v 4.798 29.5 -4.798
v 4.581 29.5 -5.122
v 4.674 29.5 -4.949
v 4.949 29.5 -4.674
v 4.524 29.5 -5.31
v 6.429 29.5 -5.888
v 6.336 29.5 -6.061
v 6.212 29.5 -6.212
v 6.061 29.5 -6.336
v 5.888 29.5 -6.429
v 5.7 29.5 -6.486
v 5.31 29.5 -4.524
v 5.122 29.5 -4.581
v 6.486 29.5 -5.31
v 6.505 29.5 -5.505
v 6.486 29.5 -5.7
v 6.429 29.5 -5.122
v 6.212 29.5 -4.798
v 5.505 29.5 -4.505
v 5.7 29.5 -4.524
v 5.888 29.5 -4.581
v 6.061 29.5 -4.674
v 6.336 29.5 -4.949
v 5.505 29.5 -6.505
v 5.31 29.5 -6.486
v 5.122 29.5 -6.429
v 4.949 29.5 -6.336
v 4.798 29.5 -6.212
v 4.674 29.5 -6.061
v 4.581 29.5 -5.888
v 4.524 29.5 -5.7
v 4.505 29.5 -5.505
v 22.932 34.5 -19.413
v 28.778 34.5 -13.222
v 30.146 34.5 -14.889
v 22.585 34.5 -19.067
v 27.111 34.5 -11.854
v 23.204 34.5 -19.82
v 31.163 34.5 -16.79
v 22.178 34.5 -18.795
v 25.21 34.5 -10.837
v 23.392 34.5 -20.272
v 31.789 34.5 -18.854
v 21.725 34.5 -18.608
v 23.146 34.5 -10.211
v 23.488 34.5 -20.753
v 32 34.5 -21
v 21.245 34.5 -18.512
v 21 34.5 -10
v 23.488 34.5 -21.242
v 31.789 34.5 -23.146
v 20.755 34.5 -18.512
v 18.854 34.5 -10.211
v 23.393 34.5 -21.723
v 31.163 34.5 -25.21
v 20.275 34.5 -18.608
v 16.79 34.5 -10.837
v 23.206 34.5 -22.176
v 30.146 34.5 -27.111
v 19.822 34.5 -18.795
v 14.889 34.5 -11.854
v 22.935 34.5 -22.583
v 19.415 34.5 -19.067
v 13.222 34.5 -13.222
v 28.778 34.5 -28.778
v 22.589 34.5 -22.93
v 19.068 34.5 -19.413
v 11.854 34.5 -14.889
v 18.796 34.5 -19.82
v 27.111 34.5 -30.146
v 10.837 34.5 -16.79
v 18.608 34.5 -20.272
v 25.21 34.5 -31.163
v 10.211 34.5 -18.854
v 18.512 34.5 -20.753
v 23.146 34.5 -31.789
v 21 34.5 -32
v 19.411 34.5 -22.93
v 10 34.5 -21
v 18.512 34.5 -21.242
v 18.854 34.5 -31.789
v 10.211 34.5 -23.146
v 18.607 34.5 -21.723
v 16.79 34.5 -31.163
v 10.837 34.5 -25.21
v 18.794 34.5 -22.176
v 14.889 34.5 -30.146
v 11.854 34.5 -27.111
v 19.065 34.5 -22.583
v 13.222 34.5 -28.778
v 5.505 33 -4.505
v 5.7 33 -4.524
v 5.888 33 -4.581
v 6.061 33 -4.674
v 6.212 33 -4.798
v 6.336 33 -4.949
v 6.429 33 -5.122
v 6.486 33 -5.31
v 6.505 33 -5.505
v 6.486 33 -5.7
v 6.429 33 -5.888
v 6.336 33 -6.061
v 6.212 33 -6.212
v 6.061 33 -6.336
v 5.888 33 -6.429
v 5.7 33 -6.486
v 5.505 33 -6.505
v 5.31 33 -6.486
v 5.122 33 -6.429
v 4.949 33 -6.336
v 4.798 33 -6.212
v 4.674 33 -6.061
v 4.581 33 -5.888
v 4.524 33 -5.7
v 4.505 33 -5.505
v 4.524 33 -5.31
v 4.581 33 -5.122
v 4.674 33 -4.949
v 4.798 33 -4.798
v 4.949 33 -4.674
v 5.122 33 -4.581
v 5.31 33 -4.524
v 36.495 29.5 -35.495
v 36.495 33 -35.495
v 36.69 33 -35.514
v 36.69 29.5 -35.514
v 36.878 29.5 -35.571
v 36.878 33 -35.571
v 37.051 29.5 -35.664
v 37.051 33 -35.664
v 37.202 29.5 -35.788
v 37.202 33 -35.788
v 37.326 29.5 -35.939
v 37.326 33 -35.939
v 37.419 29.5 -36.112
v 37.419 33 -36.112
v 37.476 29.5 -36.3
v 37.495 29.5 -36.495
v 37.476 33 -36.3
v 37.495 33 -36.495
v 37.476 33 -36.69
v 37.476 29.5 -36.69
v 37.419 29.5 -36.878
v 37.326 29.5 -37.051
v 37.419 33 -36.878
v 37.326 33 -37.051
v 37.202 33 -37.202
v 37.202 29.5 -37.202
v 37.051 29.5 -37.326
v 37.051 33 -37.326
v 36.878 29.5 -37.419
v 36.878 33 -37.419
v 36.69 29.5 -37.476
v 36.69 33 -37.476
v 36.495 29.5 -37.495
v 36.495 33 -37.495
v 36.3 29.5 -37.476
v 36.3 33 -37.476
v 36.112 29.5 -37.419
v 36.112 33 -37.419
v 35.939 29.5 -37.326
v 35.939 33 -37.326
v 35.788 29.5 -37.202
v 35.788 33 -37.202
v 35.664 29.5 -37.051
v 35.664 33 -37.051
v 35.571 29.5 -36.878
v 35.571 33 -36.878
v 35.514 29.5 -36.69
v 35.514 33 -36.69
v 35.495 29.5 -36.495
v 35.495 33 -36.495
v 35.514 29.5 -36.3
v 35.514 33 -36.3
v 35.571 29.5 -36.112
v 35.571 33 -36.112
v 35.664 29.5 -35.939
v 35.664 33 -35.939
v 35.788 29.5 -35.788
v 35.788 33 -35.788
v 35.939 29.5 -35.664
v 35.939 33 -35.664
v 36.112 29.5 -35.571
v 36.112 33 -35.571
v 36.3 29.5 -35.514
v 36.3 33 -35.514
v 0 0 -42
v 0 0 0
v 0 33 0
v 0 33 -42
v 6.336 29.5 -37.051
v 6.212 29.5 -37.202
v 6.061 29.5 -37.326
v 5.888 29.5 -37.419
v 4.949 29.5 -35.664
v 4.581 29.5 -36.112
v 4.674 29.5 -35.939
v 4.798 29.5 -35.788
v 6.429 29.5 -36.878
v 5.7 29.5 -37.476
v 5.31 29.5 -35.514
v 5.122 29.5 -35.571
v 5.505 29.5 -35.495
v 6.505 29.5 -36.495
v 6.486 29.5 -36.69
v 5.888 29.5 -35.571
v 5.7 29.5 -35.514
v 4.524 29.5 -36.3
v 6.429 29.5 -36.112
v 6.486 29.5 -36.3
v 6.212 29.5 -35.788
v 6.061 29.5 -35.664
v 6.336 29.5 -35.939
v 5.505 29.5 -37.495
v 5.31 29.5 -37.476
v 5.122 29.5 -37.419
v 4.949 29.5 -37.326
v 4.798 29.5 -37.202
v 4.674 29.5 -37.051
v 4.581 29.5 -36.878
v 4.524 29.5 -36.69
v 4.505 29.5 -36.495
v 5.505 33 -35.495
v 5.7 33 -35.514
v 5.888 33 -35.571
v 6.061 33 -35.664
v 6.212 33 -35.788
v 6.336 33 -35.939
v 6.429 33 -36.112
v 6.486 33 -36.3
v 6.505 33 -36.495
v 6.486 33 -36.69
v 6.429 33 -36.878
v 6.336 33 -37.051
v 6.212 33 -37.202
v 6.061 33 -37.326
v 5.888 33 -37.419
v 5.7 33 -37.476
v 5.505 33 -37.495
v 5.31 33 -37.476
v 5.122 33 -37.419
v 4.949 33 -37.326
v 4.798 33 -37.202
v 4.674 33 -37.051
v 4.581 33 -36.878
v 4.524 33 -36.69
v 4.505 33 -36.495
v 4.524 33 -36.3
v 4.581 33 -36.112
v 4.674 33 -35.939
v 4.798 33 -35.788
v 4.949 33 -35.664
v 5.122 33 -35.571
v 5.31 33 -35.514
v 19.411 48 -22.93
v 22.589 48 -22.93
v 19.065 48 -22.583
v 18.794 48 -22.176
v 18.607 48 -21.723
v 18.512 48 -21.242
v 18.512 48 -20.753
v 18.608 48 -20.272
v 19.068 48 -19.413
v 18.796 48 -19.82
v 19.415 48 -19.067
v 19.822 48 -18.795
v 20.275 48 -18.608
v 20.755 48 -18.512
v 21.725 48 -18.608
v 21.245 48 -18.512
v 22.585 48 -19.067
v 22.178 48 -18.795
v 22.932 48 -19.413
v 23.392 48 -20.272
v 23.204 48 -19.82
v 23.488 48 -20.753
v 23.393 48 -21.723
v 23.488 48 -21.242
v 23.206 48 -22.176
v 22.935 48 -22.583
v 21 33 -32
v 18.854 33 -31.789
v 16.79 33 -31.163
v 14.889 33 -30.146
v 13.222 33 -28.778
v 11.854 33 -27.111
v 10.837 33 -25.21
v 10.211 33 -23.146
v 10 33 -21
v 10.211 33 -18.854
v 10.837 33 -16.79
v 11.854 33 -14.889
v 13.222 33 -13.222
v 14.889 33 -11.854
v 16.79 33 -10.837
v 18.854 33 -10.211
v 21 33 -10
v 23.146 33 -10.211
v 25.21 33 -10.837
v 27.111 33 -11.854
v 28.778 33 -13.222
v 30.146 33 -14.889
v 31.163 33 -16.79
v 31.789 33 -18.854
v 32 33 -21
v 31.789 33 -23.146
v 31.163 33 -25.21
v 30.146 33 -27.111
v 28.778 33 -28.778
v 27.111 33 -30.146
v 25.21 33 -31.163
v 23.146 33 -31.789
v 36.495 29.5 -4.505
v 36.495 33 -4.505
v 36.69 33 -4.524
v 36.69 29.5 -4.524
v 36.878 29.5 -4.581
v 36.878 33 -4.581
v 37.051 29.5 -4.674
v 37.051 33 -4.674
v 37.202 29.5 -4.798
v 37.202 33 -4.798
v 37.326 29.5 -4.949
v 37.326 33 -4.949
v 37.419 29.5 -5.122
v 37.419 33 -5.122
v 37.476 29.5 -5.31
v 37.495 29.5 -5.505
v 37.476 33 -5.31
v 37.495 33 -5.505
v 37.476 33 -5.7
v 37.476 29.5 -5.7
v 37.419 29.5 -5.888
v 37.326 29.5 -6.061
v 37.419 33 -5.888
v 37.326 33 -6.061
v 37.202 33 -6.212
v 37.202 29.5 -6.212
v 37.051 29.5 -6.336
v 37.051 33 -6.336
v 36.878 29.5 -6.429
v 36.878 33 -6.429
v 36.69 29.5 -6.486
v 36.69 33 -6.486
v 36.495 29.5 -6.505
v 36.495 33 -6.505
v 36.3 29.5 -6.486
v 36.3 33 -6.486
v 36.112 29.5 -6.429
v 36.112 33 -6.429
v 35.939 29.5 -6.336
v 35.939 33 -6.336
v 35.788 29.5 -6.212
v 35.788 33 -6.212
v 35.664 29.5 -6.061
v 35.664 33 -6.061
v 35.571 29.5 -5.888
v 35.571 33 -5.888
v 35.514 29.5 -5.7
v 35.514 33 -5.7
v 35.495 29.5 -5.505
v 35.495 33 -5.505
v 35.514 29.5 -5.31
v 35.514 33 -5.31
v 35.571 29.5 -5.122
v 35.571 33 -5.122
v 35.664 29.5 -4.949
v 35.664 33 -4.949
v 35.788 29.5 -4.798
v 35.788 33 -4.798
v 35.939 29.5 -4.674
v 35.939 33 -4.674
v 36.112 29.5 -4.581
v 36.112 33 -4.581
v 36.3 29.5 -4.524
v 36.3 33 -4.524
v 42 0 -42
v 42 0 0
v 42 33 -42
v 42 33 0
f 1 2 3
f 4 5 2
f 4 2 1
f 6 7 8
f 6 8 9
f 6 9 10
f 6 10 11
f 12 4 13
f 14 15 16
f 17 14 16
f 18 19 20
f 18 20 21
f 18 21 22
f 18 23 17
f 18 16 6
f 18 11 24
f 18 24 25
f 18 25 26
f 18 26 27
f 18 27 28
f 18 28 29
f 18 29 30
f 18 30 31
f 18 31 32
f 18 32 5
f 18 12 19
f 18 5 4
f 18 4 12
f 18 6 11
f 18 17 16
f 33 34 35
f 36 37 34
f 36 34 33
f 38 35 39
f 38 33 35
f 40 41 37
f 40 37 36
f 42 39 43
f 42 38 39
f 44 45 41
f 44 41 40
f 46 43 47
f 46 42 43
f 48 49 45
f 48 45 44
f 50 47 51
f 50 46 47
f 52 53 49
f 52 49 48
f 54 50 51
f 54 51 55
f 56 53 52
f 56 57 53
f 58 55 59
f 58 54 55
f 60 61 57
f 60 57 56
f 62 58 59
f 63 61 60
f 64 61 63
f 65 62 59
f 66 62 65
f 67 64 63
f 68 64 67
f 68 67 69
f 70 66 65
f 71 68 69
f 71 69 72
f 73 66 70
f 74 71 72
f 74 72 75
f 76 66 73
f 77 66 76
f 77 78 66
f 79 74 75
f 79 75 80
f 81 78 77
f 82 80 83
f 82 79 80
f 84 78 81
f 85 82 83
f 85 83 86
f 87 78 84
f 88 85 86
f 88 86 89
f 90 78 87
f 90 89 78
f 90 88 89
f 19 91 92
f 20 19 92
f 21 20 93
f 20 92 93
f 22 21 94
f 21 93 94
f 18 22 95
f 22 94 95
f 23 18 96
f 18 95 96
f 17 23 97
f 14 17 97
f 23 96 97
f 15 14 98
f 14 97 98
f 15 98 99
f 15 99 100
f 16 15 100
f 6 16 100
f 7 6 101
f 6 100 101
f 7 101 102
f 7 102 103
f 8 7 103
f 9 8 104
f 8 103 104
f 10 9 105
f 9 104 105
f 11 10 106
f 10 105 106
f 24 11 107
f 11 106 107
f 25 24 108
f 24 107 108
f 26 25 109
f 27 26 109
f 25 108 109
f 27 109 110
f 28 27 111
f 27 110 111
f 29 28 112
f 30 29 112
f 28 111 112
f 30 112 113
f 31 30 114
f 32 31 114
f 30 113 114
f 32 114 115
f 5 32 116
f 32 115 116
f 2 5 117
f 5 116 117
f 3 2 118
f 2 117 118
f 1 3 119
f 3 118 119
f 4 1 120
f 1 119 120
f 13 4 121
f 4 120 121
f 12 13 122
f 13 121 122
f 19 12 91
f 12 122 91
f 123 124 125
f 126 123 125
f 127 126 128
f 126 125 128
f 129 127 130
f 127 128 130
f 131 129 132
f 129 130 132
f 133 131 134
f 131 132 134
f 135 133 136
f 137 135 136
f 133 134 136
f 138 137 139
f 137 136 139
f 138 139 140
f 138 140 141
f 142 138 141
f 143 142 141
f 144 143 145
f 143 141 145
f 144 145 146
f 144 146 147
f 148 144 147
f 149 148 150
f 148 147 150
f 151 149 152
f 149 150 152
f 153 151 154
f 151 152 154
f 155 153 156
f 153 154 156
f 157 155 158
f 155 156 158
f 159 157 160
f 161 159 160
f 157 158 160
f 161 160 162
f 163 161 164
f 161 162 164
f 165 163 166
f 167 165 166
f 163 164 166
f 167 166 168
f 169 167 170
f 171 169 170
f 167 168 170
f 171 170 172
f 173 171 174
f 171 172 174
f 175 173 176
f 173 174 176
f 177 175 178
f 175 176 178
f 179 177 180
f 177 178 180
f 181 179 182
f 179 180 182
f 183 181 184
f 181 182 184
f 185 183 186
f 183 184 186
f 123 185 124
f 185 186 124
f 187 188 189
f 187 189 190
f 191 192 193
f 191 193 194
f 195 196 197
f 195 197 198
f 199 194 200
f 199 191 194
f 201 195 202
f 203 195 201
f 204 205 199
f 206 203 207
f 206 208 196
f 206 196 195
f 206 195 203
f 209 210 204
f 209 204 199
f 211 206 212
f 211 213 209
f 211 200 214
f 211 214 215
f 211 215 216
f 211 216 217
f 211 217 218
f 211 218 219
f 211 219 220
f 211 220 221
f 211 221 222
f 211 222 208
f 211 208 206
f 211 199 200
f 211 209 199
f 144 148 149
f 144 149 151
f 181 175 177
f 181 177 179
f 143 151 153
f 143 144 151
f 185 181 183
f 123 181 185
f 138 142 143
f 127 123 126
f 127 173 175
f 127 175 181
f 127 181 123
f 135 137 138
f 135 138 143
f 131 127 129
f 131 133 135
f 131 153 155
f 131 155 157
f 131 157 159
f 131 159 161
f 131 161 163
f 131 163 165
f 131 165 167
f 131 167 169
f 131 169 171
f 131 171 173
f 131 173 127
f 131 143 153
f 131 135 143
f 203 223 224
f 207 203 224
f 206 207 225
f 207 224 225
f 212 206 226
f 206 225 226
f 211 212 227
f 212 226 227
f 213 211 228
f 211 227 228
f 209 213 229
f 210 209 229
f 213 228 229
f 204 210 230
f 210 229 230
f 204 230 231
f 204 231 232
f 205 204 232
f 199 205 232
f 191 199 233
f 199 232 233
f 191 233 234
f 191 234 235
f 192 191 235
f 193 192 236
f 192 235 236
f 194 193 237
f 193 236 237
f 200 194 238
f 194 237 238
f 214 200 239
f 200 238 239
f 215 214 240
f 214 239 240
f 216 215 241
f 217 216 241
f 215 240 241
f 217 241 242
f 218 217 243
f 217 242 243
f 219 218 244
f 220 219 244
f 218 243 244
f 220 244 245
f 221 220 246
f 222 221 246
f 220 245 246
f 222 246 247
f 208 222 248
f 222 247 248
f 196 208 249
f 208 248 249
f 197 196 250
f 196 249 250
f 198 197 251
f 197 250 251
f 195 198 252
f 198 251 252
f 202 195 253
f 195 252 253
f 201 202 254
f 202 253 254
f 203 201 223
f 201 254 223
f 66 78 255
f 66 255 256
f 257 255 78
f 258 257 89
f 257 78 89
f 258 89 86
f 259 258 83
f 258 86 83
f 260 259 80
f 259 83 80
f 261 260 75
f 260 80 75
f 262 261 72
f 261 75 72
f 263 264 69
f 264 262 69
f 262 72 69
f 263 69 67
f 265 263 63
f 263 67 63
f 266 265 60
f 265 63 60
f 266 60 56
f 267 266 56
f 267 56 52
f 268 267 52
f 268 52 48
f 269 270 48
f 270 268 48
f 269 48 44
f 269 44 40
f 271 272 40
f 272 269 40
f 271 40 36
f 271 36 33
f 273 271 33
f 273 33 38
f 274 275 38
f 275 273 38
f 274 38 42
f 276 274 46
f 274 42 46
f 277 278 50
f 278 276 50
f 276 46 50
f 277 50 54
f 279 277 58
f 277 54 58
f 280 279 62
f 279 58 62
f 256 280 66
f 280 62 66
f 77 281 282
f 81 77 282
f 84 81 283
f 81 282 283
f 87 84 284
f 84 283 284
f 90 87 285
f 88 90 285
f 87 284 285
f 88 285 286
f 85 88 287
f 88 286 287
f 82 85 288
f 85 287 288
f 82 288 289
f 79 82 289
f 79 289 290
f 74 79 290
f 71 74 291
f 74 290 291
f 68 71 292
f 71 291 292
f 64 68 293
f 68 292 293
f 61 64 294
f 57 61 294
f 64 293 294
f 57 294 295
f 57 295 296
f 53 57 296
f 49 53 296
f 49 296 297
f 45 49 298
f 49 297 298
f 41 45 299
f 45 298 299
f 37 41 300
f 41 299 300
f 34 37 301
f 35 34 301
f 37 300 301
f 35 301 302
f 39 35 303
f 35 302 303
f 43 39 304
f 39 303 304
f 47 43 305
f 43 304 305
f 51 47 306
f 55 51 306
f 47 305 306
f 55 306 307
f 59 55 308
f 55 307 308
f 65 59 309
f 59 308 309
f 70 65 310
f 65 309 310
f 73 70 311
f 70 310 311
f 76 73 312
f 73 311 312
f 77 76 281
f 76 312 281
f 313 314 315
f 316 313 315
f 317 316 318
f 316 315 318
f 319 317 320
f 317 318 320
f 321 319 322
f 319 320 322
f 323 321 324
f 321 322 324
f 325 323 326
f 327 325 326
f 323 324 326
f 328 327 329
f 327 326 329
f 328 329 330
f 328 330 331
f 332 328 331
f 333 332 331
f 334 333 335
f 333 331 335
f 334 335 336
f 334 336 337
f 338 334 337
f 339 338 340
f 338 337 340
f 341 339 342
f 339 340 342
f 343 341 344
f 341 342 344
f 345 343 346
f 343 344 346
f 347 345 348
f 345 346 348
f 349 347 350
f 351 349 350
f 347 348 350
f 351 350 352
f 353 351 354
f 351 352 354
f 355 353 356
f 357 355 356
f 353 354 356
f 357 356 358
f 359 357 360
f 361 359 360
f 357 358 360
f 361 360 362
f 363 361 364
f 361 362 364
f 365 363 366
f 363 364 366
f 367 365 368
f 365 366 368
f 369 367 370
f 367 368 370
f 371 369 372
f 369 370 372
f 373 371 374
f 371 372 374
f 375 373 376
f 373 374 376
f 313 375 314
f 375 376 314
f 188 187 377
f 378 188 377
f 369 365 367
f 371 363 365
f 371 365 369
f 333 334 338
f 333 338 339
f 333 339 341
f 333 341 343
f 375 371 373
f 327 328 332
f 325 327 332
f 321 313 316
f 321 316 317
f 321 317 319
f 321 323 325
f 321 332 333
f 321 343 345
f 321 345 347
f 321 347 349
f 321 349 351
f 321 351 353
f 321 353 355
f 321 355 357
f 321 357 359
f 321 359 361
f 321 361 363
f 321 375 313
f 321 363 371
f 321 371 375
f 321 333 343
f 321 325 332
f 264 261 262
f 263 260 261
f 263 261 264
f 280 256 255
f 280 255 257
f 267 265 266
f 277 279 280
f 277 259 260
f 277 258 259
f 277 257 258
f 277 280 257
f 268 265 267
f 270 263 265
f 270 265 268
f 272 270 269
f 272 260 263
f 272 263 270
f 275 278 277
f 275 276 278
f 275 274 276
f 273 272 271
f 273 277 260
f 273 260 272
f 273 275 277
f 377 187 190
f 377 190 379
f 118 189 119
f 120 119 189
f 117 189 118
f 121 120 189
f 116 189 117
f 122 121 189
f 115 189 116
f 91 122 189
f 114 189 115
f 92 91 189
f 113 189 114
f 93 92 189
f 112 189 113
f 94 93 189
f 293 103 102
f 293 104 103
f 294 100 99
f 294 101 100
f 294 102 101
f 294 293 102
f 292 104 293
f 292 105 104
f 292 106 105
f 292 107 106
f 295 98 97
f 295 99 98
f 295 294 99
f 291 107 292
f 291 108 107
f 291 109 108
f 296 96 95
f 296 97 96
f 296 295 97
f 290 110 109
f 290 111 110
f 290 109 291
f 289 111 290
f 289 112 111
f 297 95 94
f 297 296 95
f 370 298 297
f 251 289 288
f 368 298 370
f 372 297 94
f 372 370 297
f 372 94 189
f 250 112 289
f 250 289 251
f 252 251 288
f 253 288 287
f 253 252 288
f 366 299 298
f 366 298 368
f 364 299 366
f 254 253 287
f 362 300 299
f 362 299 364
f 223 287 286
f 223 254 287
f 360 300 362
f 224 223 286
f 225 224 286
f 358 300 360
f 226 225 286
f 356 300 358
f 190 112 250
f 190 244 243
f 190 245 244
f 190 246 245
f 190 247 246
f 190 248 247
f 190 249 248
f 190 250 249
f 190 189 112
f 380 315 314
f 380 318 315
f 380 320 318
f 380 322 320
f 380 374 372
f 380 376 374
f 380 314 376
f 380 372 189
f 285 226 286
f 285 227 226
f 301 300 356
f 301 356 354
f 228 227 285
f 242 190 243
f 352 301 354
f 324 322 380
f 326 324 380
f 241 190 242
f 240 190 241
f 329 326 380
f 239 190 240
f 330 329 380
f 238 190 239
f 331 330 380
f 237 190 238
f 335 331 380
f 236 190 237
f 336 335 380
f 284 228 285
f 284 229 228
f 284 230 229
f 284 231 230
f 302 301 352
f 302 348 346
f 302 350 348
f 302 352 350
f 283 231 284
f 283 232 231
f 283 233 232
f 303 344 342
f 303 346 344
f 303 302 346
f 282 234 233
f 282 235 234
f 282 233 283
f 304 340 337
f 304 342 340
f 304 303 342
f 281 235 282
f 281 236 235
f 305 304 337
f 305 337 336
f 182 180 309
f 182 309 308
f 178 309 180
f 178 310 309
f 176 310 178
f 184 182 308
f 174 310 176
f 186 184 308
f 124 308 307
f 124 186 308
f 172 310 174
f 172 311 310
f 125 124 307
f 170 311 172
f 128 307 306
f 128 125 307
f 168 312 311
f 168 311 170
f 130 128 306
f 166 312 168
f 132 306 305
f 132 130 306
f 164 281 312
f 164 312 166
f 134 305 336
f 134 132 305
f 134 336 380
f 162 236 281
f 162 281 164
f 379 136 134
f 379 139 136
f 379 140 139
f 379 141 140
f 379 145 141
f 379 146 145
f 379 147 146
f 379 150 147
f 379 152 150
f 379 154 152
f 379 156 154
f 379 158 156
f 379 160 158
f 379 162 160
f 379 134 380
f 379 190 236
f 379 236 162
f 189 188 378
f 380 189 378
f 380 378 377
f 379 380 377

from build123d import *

# Parameters (mm, degrees)
SKETCH1_W           = 42
SKETCH1_H           = 42
BOSS_EXTRUDE1_DEPTH = 33
SKETCH2_R           = 1
CUT_EXTRUDE1_DEPTH  = 3.5
SKETCH3_R           = 11
BOSS_EXTRUDE2_DEPTH = 1.5
SKETCH4_R           = 2.5
BOSS_EXTRUDE3_DEPTH = 13.5
CUT_EXTRUDE2_START  = -13.5
CUT_EXTRUDE2_DEPTH  = 13.5


with BuildPart() as part:
    # Sketch1 → Boss-Extrude1 (new body)
    with BuildSketch(Plane(origin=(0, 0, 0), x_dir=(1, 0, 0), z_dir=(0, 1, 0))):
        with Locations((21, 21)):
            Rectangle(SKETCH1_W, SKETCH1_H)
    extrude(amount=BOSS_EXTRUDE1_DEPTH)

    # Sketch2 → Cut-Extrude1 (cut)
    with BuildSketch(Plane(origin=(0, 33, 0), x_dir=(1, 0, 0), z_dir=(0, 1, 0))):
        with Locations(Location((5.505, 36.495, 0), (0, 0, 270))):
            Circle(SKETCH2_R)
        with Locations(Location((36.495, 36.495, 0), (0, 0, 270))):
            Circle(SKETCH2_R)
        with Locations(Location((36.495, 5.505, 0), (0, 0, 270))):
            Circle(SKETCH2_R)
        with Locations(Location((5.505, 5.505, 0), (0, 0, 270))):
            Circle(SKETCH2_R)
    extrude(amount=-CUT_EXTRUDE1_DEPTH, mode=Mode.SUBTRACT)

    # Sketch3 → Boss-Extrude2 (add)
    with BuildSketch(Plane(origin=(0, 33, 0), x_dir=(1, 0, 0), z_dir=(0, 1, 0))):
        with Locations(Location((21, 21, 0), (0, 0, 90))):
            Circle(SKETCH3_R)
    extrude(amount=BOSS_EXTRUDE2_DEPTH)

    # Sketch4 → Boss-Extrude3 (add)
    with BuildSketch(Plane(origin=(0, 34.5, 0), x_dir=(1, 0, 0), z_dir=(0, 1, 0))):
        with Locations(Location((21, 21, 0), (0, 0, 270))):
            Circle(SKETCH4_R)
    extrude(amount=BOSS_EXTRUDE3_DEPTH)

    # Sketch5 → Cut-Extrude2 (cut)
    with BuildSketch(Plane(origin=(0, 48, 0), x_dir=(1, 0, 0), z_dir=(0, 1, 0)).offset(CUT_EXTRUDE2_START)):
        with BuildLine():
            Line((19.410943676, 22.93), (22.589056324, 22.93))
            ThreePointArc((22.589056324, 22.93), (21, 23.5), (19.410943676, 22.93))
        make_face()
    extrude(amount=CUT_EXTRUDE2_DEPTH, mode=Mode.SUBTRACT)


solid = part.part
